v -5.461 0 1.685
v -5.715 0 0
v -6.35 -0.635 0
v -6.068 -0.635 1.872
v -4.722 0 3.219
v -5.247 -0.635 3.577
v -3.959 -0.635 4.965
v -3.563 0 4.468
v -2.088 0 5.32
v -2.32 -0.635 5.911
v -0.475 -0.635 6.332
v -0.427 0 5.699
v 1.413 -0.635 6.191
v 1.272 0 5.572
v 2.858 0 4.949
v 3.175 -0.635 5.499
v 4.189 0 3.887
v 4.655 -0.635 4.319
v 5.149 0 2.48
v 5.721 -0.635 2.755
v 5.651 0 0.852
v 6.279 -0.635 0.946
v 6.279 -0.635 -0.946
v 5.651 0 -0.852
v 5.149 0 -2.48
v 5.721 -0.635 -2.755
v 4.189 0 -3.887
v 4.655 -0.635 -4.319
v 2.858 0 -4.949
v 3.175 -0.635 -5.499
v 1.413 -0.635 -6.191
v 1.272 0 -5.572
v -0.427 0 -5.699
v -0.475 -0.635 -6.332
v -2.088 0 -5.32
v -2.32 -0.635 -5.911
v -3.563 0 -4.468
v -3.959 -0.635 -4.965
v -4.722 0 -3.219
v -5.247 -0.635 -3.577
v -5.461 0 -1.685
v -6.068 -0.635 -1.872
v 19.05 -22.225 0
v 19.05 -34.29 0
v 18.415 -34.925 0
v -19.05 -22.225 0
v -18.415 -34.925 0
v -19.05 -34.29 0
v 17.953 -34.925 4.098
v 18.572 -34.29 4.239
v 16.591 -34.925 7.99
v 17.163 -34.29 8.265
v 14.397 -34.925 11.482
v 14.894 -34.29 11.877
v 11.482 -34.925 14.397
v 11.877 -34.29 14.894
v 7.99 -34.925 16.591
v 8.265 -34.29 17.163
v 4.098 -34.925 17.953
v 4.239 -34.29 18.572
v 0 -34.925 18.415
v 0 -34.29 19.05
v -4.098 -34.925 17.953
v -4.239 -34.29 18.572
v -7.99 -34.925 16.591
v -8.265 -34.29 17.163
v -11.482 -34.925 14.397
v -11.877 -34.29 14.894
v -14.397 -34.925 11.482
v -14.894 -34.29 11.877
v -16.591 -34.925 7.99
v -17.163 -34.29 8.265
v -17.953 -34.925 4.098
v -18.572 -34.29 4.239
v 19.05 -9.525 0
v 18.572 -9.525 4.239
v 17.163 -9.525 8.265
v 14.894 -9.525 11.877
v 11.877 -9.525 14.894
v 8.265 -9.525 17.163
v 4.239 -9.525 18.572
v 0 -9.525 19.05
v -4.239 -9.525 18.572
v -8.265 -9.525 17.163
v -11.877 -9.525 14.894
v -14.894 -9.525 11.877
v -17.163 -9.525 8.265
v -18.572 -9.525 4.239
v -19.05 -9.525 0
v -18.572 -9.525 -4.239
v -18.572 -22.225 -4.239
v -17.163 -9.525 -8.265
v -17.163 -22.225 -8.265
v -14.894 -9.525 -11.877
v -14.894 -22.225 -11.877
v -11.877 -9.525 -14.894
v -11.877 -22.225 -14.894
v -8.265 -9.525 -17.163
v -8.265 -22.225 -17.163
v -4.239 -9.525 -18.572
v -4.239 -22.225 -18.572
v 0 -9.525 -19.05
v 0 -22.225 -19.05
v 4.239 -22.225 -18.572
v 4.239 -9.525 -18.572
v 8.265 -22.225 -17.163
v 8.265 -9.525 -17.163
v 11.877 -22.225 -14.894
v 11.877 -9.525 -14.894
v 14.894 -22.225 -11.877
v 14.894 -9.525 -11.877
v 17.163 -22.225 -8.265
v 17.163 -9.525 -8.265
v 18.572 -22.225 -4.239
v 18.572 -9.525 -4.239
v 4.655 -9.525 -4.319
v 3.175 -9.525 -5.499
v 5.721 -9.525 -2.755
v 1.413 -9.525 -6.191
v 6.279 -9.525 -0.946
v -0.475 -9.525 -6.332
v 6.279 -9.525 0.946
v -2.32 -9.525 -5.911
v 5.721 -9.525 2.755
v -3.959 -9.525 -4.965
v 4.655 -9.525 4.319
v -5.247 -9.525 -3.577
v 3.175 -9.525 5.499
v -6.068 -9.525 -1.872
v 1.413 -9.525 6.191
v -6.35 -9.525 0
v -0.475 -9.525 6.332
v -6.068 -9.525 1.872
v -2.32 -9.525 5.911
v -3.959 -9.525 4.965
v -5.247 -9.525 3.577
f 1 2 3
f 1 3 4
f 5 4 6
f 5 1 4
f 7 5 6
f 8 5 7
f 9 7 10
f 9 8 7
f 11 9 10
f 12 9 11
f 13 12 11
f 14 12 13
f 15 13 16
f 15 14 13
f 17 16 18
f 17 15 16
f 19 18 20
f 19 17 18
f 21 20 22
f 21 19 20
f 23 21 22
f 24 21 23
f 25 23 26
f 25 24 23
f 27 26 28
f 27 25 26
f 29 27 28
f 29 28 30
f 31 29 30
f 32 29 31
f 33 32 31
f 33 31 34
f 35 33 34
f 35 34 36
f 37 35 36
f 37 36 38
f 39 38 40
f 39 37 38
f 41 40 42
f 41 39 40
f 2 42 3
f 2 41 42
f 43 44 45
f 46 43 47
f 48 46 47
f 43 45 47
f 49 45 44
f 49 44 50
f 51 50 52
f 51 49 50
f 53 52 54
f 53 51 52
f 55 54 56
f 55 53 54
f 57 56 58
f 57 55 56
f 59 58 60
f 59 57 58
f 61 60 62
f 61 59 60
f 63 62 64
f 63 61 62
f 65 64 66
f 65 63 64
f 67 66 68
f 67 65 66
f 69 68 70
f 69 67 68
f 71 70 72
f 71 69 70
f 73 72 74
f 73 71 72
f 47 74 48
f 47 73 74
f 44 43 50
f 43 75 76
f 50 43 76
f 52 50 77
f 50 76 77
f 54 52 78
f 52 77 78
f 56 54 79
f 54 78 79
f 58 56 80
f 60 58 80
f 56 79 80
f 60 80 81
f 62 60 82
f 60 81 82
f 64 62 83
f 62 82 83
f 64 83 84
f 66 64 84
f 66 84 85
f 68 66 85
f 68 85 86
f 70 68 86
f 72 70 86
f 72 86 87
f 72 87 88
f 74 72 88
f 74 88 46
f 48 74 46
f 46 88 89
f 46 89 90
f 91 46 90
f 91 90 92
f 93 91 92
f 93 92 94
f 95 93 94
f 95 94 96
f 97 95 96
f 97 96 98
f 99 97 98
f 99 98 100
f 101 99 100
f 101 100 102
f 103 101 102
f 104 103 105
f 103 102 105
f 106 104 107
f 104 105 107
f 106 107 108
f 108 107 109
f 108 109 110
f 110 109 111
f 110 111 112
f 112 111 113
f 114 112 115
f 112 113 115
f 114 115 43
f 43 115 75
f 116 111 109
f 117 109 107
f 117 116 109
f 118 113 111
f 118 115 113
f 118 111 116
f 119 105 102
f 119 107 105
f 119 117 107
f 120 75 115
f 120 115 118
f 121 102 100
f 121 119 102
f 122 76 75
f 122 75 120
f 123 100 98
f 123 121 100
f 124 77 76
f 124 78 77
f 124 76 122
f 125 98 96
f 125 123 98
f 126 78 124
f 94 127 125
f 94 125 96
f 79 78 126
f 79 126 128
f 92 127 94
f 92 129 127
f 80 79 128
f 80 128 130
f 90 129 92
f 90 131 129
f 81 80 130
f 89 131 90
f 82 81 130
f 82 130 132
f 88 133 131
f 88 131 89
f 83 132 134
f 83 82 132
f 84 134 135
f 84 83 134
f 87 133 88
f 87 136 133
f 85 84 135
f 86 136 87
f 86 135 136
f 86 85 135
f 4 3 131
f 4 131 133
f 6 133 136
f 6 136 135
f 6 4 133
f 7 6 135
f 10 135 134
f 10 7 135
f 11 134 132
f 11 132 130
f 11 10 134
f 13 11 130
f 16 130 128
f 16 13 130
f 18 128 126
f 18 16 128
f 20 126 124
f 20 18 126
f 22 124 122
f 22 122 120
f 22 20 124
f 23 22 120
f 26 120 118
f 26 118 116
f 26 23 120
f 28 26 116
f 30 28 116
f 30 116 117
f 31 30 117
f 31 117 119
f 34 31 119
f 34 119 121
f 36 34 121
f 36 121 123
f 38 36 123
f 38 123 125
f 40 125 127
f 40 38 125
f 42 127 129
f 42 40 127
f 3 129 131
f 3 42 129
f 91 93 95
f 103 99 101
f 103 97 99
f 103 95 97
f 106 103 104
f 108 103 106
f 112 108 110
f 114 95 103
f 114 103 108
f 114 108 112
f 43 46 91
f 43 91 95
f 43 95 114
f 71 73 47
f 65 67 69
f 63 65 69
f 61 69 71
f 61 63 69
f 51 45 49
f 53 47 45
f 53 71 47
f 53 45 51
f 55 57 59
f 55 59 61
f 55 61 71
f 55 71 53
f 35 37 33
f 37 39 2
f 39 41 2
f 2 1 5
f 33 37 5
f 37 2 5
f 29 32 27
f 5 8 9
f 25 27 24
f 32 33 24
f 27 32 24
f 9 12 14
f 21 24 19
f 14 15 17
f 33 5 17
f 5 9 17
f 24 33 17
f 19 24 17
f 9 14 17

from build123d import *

# Parameters (mm, degrees)
F0_R     = 19.05
F1_DEPTH = 34.925
F2_R     = 19.05
F2_R_2   = 6.35
F3_DEPTH = 9.525
F4_SIZE  = 0.635
F6_DEPTH = 12.7


with BuildPart() as f1:
    # F0 (on Front) → F1 (new body)
    with BuildSketch(Plane.XZ):
        Circle(F0_R)
    extrude(amount=F1_DEPTH)

    # F2 (on face) → F3 (cut)
    with BuildSketch(Plane(origin=(0, 0, 0), x_dir=(-1, 0, 0), z_dir=(0, 1, 0))):
        Circle(F2_R)
        Circle(F2_R_2, mode=Mode.SUBTRACT)
    extrude(amount=-F3_DEPTH, mode=Mode.SUBTRACT)

    # F4
    f4_edges = [f1.edges().sort_by_distance(p)[0] for p in [
        (6.35, 0, 0),
        (-19.05, -34.925, 0),
    ]]
    chamfer(f4_edges, length=F4_SIZE)

    # F5 (on face) → F6 (cut)
    with BuildSketch(Plane.XZ.offset(34.925)):
        with BuildLine():
            Line((-25.4, 0), (-25.4, -25.4))
            Line((-25.4, -25.4), (25.4, -25.4))
            Line((25.4, -25.4), (25.4, 0))
            Line((25.4, 0), (18.415, 0))
            ThreePointArc((18.415, 0), (0, -18.415), (-18.415, 0))
            Line((-18.415, 0), (-25.4, 0))
        make_face()
        with BuildLine():
            Line((18.415, 0), (-18.415, 0))
            ThreePointArc((-18.415, 0), (0, -18.415), (18.415, 0))
        make_face()
    extrude(amount=-F6_DEPTH, mode=Mode.SUBTRACT)


solid = f1.part
